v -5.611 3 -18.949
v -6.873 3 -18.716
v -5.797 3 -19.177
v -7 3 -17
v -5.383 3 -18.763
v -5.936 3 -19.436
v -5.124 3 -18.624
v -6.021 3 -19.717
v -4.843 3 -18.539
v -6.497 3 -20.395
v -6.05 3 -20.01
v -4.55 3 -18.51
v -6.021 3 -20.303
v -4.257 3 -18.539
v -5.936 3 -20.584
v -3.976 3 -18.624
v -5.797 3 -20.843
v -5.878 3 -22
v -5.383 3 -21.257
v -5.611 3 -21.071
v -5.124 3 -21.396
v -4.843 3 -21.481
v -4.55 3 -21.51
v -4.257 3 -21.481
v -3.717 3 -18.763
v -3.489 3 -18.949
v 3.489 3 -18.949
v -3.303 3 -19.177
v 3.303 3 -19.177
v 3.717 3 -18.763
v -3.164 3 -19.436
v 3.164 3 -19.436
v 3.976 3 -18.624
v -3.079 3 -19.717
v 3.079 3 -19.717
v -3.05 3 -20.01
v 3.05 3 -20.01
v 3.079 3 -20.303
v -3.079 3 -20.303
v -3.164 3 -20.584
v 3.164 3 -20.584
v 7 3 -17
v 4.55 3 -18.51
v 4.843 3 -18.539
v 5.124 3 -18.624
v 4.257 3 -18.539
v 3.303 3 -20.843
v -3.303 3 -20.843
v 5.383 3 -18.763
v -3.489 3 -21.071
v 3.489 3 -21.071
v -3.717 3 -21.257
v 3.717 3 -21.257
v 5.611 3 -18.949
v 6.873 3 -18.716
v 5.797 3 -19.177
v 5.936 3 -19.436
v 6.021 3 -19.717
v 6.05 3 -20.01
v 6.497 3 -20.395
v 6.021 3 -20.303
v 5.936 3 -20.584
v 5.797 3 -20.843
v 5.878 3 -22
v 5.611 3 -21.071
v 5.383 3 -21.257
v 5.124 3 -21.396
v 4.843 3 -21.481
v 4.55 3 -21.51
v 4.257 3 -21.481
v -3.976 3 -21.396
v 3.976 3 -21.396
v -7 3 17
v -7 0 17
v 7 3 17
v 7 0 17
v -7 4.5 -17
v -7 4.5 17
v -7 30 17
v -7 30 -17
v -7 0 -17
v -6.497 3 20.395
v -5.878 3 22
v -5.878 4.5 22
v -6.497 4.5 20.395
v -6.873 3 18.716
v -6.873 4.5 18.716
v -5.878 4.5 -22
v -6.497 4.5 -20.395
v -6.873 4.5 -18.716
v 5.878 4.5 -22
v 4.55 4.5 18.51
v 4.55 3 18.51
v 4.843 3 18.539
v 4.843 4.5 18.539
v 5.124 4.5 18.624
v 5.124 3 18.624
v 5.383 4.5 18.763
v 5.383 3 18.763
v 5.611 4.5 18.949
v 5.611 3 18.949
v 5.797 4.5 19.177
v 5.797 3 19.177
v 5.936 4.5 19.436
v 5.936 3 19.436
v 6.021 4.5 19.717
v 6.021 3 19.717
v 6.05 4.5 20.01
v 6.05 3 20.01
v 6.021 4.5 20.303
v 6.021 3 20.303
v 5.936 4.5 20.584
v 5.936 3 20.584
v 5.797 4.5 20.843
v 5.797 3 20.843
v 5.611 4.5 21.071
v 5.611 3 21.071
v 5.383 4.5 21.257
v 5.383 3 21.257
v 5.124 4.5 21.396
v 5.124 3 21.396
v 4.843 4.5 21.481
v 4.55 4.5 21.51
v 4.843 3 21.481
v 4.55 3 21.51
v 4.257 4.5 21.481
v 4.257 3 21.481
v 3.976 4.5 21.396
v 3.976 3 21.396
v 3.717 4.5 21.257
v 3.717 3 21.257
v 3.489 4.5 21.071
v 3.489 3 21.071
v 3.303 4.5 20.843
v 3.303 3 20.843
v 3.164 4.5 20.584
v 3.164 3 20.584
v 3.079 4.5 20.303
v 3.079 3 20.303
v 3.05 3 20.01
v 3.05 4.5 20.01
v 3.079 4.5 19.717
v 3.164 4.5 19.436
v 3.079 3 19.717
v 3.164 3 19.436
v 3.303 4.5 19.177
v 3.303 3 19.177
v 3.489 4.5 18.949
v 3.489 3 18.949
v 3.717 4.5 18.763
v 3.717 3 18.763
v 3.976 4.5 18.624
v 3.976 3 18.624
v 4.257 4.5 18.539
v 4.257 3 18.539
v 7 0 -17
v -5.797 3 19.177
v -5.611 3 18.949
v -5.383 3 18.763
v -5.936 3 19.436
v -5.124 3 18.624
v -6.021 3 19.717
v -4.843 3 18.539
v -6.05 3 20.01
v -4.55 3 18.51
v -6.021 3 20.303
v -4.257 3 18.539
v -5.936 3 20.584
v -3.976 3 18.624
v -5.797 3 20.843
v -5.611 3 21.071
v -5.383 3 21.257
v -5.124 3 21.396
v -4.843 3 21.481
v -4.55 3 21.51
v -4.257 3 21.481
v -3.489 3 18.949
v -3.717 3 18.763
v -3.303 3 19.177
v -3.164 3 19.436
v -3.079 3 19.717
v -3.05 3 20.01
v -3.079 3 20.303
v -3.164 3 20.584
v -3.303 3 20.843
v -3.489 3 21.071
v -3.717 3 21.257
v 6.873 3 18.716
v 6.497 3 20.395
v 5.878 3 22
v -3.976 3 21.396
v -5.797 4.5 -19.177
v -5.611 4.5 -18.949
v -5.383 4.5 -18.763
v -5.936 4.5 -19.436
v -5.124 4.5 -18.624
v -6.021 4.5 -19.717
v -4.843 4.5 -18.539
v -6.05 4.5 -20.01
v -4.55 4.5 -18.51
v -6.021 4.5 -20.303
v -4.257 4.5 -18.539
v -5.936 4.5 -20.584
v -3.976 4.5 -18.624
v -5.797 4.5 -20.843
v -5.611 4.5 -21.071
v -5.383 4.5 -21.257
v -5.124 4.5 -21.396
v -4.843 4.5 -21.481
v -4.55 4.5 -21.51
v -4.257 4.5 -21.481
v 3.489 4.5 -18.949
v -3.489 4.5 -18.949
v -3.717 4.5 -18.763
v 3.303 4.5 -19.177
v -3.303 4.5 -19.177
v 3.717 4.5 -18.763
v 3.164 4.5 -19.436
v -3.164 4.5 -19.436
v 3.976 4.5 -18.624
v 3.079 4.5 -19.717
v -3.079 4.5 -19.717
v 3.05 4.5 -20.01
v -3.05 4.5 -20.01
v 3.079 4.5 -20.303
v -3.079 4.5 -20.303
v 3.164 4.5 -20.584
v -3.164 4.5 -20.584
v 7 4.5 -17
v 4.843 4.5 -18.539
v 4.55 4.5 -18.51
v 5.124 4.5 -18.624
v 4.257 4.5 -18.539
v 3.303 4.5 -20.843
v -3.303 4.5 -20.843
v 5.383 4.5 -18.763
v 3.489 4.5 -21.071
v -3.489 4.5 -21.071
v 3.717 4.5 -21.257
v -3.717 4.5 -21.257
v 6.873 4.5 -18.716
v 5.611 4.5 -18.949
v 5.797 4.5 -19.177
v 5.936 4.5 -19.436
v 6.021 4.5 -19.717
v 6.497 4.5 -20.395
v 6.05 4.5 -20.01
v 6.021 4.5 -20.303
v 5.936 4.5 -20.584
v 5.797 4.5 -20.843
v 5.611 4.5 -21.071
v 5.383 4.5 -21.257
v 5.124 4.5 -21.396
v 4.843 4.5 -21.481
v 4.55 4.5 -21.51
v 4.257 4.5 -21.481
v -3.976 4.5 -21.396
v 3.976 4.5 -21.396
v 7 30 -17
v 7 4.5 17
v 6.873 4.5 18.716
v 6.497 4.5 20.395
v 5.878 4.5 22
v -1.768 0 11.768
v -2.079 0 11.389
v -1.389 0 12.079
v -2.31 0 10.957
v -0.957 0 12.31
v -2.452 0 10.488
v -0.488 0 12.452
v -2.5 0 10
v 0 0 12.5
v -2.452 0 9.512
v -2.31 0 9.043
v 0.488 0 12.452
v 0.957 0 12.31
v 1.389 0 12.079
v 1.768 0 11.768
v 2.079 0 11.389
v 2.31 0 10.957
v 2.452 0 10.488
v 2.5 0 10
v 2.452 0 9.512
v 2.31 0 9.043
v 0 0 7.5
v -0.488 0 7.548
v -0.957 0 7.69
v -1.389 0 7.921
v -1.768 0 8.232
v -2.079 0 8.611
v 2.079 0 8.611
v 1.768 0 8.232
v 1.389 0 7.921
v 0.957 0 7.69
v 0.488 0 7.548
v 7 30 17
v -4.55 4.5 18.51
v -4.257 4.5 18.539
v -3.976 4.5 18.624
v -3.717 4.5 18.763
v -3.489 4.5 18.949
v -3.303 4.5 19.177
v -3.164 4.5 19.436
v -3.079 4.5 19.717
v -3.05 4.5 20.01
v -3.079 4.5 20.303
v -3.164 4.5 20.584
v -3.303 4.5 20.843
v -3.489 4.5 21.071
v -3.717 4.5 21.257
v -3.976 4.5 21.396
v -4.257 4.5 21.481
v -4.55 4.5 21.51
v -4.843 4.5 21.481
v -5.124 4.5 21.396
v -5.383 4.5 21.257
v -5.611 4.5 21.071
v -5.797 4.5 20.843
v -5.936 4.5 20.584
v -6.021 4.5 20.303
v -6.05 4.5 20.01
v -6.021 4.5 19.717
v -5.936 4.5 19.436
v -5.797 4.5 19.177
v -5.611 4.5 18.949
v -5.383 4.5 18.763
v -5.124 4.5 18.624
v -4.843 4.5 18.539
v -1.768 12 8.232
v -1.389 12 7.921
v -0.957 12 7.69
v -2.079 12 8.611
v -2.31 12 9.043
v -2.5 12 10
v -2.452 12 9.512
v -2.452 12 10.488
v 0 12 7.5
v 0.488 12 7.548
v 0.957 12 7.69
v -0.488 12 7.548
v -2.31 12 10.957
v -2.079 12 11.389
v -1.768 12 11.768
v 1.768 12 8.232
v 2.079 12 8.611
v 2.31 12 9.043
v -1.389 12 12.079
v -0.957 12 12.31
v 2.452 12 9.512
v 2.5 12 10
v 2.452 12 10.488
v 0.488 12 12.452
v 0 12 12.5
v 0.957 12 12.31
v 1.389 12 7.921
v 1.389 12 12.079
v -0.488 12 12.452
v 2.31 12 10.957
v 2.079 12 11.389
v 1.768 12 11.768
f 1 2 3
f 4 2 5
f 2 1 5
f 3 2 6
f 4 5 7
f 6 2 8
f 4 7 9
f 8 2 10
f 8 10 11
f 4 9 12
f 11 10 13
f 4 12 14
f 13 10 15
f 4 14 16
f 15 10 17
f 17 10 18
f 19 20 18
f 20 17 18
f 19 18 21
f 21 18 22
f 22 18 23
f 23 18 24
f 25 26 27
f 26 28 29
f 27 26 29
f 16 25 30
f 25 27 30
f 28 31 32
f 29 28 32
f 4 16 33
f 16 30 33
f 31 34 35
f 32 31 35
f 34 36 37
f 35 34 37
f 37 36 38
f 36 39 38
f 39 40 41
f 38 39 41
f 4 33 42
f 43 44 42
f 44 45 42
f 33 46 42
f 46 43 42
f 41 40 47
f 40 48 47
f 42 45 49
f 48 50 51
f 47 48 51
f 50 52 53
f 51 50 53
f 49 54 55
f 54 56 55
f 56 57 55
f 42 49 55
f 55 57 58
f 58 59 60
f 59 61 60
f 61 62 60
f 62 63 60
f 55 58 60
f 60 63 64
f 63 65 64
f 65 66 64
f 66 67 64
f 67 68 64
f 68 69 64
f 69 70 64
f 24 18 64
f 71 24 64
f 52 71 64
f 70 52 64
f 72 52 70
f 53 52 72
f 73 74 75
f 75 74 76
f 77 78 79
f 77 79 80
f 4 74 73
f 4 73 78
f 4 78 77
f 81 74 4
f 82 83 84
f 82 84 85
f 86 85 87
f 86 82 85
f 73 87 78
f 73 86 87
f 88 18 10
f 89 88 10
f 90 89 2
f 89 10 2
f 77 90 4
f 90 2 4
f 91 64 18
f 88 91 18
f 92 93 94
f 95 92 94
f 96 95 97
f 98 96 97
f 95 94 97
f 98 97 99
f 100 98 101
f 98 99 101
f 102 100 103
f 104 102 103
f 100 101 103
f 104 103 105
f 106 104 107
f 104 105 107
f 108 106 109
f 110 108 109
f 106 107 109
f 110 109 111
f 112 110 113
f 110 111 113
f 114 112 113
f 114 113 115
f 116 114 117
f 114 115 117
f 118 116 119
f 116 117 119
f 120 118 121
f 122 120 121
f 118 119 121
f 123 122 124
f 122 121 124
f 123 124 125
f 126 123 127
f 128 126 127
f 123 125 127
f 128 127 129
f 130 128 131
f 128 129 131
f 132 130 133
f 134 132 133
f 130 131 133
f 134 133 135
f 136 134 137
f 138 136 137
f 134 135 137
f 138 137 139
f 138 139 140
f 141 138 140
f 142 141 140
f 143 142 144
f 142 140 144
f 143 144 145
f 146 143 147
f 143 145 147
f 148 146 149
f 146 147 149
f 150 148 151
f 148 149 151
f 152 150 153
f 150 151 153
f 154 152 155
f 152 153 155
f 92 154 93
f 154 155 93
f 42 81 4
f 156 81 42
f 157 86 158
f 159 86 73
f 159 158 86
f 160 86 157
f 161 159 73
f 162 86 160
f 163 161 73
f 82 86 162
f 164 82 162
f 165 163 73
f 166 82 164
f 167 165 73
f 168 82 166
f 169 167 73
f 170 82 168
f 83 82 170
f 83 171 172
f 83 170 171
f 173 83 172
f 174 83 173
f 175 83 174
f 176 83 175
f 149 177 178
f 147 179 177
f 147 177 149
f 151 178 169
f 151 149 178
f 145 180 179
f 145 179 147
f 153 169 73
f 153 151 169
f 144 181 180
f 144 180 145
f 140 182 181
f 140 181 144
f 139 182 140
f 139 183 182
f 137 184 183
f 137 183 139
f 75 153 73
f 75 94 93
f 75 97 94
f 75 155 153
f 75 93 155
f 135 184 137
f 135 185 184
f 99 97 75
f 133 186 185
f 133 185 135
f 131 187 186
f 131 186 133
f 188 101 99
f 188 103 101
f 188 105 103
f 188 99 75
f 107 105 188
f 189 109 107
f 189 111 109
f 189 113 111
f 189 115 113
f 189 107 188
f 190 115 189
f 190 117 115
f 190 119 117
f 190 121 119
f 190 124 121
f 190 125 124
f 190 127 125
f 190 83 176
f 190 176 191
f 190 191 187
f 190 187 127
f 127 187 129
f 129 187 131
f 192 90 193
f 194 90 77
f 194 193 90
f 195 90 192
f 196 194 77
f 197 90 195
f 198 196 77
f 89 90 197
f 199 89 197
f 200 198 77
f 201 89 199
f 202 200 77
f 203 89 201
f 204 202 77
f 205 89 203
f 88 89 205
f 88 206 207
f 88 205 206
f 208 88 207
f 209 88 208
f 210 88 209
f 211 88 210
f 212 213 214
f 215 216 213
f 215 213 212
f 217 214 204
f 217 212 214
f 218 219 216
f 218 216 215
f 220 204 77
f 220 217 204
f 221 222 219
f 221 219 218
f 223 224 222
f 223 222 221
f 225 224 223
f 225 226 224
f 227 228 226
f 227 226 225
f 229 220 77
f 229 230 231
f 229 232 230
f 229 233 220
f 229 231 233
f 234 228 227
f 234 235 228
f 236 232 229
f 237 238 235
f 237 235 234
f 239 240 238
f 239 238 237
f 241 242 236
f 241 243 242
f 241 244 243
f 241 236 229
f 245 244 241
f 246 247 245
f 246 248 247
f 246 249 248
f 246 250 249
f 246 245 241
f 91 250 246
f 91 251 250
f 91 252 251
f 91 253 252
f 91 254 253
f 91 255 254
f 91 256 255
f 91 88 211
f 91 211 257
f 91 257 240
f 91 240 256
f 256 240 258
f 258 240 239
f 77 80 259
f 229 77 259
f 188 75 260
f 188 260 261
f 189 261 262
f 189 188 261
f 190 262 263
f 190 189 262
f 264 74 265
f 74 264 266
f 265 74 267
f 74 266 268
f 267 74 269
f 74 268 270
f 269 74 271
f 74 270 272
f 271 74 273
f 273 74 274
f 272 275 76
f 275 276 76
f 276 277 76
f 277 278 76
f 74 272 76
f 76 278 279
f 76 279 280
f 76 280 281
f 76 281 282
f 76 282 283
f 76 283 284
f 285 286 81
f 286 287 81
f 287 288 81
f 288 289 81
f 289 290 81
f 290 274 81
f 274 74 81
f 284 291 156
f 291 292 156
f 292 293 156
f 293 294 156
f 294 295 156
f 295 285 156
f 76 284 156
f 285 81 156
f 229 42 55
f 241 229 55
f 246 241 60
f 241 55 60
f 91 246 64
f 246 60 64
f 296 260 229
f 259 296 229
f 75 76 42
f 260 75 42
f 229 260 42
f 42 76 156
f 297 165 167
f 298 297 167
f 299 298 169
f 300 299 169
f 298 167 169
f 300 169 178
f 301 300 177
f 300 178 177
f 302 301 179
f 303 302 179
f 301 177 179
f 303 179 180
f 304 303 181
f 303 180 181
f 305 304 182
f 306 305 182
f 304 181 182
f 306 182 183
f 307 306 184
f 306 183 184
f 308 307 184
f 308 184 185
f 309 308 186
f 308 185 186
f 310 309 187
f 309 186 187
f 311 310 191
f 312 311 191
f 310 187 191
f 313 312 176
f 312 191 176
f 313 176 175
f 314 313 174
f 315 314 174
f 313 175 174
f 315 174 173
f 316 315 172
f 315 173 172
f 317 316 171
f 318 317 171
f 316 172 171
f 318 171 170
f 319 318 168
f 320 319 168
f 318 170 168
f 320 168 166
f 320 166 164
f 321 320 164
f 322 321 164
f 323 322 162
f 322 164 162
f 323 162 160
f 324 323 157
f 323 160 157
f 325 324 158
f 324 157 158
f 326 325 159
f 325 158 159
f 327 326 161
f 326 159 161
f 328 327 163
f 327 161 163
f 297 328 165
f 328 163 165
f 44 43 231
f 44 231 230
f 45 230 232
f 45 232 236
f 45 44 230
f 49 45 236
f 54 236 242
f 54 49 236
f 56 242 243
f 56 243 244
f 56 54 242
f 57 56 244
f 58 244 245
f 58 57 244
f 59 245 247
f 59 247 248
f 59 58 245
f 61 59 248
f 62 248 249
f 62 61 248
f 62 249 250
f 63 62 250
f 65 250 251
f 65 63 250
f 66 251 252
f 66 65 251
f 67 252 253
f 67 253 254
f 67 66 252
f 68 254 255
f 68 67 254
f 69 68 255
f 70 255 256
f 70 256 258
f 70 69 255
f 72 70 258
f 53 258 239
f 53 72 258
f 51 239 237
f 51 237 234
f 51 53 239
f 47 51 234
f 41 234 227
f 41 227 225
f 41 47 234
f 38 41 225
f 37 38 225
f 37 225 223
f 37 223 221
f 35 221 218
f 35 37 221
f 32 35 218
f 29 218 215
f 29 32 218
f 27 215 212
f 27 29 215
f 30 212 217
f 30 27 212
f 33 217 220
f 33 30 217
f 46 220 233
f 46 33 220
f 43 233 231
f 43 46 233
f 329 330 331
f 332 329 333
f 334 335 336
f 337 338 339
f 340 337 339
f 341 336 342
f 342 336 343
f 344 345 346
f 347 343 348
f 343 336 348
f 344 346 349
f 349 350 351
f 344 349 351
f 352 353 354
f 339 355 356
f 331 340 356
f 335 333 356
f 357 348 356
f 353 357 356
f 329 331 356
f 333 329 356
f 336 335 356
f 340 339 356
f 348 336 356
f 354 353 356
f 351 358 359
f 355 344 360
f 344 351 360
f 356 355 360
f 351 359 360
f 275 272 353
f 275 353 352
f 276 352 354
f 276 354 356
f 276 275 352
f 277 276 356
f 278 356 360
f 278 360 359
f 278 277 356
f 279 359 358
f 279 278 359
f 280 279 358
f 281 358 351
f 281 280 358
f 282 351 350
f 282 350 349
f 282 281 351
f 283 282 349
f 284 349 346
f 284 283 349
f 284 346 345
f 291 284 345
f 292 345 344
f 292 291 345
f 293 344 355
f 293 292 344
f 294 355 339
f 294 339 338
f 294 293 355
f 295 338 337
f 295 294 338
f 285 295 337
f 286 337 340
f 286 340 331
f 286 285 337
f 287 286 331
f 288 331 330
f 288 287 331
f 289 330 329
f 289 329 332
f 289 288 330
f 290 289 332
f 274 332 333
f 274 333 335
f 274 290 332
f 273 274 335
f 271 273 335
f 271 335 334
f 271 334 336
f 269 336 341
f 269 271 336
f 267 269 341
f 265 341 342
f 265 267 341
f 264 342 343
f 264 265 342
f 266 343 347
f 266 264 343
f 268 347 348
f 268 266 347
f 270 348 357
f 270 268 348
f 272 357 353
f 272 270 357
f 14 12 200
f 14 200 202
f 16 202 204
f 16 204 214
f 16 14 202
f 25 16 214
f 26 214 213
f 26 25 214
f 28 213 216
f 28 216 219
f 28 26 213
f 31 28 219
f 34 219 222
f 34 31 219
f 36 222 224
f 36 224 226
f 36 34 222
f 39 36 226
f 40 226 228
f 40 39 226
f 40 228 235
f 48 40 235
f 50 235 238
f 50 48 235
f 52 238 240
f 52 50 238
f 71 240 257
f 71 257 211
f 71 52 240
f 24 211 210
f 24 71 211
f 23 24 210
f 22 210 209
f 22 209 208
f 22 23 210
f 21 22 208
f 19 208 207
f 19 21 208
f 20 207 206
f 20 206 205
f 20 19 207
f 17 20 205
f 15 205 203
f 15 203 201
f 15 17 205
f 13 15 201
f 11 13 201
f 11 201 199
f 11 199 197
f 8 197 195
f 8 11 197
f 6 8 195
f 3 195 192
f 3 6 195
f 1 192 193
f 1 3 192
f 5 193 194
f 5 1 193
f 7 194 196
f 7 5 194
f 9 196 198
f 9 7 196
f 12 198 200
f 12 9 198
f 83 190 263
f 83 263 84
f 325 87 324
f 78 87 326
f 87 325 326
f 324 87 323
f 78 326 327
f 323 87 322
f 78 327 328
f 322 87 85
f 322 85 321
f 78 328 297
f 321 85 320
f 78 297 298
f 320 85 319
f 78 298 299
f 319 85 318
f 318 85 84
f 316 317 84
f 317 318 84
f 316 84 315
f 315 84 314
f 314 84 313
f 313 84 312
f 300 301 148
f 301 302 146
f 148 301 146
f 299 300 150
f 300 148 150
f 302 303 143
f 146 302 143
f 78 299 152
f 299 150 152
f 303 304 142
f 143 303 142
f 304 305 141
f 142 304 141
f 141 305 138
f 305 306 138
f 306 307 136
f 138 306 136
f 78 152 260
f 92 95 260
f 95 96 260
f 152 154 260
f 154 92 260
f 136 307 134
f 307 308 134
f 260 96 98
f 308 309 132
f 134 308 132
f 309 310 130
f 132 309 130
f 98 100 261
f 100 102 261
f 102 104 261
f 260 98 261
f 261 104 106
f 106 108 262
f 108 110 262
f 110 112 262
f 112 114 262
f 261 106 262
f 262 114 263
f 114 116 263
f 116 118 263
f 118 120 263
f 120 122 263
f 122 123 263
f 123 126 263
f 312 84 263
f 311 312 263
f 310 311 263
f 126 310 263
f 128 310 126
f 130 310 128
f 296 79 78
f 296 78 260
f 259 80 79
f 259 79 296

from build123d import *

# Parameters (mm, degrees)
SKETCH1_W           = 14
SKETCH1_H           = 34
BOSS_EXTRUDE1_DEPTH = 30
SKETCH1_3_R         = 2.5
CUT_EXTRUDE1_DEPTH  = 12
BOSS_EXTRUDE2_START = -3
SKETCH4_R           = 1.5
BOSS_EXTRUDE2_DEPTH = 1.5


with BuildPart() as part:
    # Sketch1 → Boss-Extrude1 (new body)
    with BuildSketch(Plane(origin=(0, 0, 0), x_dir=(1, 0, 0), z_dir=(0, 1, 0))):
        Rectangle(SKETCH1_W, SKETCH1_H)
    extrude(amount=BOSS_EXTRUDE1_DEPTH)

    # Sketch1<3> → Cut-Extrude1 (cut)
    with BuildSketch(Plane(origin=(0, 0, 0), x_dir=(1, 0, 0), z_dir=(0, 1, 0))):
        with Locations((0, -10)):
            Circle(SKETCH1_3_R)
    extrude(amount=CUT_EXTRUDE1_DEPTH, mode=Mode.SUBTRACT)

    # Sketch4 → Boss-Extrude2 (add)
    with BuildSketch(Plane.XZ.offset(BOSS_EXTRUDE2_START)):
        with BuildLine():
            ThreePointArc((-5.877806956, 22), (-6.716005023, 19.562192285), (-7, 17))
            Line((-7, 17), (7, 17))
            ThreePointArc((7, 17), (6.716005023, 19.562192285), (5.877806956, 22))
            Line((5.877806956, 22), (-5.877806956, 22))
        make_face()
        with Locations((-4.55, 20.01)):
            Circle(SKETCH4_R, mode=Mode.SUBTRACT)
        with Locations((4.55, 20.01)):
            Circle(SKETCH4_R, mode=Mode.SUBTRACT)
    boss_extrude2 = extrude(amount=-BOSS_EXTRUDE2_DEPTH)

    # Mirror1: Boss-Extrude2 across plane
    add(boss_extrude2.mirror(Plane.XY))


solid = part.part
